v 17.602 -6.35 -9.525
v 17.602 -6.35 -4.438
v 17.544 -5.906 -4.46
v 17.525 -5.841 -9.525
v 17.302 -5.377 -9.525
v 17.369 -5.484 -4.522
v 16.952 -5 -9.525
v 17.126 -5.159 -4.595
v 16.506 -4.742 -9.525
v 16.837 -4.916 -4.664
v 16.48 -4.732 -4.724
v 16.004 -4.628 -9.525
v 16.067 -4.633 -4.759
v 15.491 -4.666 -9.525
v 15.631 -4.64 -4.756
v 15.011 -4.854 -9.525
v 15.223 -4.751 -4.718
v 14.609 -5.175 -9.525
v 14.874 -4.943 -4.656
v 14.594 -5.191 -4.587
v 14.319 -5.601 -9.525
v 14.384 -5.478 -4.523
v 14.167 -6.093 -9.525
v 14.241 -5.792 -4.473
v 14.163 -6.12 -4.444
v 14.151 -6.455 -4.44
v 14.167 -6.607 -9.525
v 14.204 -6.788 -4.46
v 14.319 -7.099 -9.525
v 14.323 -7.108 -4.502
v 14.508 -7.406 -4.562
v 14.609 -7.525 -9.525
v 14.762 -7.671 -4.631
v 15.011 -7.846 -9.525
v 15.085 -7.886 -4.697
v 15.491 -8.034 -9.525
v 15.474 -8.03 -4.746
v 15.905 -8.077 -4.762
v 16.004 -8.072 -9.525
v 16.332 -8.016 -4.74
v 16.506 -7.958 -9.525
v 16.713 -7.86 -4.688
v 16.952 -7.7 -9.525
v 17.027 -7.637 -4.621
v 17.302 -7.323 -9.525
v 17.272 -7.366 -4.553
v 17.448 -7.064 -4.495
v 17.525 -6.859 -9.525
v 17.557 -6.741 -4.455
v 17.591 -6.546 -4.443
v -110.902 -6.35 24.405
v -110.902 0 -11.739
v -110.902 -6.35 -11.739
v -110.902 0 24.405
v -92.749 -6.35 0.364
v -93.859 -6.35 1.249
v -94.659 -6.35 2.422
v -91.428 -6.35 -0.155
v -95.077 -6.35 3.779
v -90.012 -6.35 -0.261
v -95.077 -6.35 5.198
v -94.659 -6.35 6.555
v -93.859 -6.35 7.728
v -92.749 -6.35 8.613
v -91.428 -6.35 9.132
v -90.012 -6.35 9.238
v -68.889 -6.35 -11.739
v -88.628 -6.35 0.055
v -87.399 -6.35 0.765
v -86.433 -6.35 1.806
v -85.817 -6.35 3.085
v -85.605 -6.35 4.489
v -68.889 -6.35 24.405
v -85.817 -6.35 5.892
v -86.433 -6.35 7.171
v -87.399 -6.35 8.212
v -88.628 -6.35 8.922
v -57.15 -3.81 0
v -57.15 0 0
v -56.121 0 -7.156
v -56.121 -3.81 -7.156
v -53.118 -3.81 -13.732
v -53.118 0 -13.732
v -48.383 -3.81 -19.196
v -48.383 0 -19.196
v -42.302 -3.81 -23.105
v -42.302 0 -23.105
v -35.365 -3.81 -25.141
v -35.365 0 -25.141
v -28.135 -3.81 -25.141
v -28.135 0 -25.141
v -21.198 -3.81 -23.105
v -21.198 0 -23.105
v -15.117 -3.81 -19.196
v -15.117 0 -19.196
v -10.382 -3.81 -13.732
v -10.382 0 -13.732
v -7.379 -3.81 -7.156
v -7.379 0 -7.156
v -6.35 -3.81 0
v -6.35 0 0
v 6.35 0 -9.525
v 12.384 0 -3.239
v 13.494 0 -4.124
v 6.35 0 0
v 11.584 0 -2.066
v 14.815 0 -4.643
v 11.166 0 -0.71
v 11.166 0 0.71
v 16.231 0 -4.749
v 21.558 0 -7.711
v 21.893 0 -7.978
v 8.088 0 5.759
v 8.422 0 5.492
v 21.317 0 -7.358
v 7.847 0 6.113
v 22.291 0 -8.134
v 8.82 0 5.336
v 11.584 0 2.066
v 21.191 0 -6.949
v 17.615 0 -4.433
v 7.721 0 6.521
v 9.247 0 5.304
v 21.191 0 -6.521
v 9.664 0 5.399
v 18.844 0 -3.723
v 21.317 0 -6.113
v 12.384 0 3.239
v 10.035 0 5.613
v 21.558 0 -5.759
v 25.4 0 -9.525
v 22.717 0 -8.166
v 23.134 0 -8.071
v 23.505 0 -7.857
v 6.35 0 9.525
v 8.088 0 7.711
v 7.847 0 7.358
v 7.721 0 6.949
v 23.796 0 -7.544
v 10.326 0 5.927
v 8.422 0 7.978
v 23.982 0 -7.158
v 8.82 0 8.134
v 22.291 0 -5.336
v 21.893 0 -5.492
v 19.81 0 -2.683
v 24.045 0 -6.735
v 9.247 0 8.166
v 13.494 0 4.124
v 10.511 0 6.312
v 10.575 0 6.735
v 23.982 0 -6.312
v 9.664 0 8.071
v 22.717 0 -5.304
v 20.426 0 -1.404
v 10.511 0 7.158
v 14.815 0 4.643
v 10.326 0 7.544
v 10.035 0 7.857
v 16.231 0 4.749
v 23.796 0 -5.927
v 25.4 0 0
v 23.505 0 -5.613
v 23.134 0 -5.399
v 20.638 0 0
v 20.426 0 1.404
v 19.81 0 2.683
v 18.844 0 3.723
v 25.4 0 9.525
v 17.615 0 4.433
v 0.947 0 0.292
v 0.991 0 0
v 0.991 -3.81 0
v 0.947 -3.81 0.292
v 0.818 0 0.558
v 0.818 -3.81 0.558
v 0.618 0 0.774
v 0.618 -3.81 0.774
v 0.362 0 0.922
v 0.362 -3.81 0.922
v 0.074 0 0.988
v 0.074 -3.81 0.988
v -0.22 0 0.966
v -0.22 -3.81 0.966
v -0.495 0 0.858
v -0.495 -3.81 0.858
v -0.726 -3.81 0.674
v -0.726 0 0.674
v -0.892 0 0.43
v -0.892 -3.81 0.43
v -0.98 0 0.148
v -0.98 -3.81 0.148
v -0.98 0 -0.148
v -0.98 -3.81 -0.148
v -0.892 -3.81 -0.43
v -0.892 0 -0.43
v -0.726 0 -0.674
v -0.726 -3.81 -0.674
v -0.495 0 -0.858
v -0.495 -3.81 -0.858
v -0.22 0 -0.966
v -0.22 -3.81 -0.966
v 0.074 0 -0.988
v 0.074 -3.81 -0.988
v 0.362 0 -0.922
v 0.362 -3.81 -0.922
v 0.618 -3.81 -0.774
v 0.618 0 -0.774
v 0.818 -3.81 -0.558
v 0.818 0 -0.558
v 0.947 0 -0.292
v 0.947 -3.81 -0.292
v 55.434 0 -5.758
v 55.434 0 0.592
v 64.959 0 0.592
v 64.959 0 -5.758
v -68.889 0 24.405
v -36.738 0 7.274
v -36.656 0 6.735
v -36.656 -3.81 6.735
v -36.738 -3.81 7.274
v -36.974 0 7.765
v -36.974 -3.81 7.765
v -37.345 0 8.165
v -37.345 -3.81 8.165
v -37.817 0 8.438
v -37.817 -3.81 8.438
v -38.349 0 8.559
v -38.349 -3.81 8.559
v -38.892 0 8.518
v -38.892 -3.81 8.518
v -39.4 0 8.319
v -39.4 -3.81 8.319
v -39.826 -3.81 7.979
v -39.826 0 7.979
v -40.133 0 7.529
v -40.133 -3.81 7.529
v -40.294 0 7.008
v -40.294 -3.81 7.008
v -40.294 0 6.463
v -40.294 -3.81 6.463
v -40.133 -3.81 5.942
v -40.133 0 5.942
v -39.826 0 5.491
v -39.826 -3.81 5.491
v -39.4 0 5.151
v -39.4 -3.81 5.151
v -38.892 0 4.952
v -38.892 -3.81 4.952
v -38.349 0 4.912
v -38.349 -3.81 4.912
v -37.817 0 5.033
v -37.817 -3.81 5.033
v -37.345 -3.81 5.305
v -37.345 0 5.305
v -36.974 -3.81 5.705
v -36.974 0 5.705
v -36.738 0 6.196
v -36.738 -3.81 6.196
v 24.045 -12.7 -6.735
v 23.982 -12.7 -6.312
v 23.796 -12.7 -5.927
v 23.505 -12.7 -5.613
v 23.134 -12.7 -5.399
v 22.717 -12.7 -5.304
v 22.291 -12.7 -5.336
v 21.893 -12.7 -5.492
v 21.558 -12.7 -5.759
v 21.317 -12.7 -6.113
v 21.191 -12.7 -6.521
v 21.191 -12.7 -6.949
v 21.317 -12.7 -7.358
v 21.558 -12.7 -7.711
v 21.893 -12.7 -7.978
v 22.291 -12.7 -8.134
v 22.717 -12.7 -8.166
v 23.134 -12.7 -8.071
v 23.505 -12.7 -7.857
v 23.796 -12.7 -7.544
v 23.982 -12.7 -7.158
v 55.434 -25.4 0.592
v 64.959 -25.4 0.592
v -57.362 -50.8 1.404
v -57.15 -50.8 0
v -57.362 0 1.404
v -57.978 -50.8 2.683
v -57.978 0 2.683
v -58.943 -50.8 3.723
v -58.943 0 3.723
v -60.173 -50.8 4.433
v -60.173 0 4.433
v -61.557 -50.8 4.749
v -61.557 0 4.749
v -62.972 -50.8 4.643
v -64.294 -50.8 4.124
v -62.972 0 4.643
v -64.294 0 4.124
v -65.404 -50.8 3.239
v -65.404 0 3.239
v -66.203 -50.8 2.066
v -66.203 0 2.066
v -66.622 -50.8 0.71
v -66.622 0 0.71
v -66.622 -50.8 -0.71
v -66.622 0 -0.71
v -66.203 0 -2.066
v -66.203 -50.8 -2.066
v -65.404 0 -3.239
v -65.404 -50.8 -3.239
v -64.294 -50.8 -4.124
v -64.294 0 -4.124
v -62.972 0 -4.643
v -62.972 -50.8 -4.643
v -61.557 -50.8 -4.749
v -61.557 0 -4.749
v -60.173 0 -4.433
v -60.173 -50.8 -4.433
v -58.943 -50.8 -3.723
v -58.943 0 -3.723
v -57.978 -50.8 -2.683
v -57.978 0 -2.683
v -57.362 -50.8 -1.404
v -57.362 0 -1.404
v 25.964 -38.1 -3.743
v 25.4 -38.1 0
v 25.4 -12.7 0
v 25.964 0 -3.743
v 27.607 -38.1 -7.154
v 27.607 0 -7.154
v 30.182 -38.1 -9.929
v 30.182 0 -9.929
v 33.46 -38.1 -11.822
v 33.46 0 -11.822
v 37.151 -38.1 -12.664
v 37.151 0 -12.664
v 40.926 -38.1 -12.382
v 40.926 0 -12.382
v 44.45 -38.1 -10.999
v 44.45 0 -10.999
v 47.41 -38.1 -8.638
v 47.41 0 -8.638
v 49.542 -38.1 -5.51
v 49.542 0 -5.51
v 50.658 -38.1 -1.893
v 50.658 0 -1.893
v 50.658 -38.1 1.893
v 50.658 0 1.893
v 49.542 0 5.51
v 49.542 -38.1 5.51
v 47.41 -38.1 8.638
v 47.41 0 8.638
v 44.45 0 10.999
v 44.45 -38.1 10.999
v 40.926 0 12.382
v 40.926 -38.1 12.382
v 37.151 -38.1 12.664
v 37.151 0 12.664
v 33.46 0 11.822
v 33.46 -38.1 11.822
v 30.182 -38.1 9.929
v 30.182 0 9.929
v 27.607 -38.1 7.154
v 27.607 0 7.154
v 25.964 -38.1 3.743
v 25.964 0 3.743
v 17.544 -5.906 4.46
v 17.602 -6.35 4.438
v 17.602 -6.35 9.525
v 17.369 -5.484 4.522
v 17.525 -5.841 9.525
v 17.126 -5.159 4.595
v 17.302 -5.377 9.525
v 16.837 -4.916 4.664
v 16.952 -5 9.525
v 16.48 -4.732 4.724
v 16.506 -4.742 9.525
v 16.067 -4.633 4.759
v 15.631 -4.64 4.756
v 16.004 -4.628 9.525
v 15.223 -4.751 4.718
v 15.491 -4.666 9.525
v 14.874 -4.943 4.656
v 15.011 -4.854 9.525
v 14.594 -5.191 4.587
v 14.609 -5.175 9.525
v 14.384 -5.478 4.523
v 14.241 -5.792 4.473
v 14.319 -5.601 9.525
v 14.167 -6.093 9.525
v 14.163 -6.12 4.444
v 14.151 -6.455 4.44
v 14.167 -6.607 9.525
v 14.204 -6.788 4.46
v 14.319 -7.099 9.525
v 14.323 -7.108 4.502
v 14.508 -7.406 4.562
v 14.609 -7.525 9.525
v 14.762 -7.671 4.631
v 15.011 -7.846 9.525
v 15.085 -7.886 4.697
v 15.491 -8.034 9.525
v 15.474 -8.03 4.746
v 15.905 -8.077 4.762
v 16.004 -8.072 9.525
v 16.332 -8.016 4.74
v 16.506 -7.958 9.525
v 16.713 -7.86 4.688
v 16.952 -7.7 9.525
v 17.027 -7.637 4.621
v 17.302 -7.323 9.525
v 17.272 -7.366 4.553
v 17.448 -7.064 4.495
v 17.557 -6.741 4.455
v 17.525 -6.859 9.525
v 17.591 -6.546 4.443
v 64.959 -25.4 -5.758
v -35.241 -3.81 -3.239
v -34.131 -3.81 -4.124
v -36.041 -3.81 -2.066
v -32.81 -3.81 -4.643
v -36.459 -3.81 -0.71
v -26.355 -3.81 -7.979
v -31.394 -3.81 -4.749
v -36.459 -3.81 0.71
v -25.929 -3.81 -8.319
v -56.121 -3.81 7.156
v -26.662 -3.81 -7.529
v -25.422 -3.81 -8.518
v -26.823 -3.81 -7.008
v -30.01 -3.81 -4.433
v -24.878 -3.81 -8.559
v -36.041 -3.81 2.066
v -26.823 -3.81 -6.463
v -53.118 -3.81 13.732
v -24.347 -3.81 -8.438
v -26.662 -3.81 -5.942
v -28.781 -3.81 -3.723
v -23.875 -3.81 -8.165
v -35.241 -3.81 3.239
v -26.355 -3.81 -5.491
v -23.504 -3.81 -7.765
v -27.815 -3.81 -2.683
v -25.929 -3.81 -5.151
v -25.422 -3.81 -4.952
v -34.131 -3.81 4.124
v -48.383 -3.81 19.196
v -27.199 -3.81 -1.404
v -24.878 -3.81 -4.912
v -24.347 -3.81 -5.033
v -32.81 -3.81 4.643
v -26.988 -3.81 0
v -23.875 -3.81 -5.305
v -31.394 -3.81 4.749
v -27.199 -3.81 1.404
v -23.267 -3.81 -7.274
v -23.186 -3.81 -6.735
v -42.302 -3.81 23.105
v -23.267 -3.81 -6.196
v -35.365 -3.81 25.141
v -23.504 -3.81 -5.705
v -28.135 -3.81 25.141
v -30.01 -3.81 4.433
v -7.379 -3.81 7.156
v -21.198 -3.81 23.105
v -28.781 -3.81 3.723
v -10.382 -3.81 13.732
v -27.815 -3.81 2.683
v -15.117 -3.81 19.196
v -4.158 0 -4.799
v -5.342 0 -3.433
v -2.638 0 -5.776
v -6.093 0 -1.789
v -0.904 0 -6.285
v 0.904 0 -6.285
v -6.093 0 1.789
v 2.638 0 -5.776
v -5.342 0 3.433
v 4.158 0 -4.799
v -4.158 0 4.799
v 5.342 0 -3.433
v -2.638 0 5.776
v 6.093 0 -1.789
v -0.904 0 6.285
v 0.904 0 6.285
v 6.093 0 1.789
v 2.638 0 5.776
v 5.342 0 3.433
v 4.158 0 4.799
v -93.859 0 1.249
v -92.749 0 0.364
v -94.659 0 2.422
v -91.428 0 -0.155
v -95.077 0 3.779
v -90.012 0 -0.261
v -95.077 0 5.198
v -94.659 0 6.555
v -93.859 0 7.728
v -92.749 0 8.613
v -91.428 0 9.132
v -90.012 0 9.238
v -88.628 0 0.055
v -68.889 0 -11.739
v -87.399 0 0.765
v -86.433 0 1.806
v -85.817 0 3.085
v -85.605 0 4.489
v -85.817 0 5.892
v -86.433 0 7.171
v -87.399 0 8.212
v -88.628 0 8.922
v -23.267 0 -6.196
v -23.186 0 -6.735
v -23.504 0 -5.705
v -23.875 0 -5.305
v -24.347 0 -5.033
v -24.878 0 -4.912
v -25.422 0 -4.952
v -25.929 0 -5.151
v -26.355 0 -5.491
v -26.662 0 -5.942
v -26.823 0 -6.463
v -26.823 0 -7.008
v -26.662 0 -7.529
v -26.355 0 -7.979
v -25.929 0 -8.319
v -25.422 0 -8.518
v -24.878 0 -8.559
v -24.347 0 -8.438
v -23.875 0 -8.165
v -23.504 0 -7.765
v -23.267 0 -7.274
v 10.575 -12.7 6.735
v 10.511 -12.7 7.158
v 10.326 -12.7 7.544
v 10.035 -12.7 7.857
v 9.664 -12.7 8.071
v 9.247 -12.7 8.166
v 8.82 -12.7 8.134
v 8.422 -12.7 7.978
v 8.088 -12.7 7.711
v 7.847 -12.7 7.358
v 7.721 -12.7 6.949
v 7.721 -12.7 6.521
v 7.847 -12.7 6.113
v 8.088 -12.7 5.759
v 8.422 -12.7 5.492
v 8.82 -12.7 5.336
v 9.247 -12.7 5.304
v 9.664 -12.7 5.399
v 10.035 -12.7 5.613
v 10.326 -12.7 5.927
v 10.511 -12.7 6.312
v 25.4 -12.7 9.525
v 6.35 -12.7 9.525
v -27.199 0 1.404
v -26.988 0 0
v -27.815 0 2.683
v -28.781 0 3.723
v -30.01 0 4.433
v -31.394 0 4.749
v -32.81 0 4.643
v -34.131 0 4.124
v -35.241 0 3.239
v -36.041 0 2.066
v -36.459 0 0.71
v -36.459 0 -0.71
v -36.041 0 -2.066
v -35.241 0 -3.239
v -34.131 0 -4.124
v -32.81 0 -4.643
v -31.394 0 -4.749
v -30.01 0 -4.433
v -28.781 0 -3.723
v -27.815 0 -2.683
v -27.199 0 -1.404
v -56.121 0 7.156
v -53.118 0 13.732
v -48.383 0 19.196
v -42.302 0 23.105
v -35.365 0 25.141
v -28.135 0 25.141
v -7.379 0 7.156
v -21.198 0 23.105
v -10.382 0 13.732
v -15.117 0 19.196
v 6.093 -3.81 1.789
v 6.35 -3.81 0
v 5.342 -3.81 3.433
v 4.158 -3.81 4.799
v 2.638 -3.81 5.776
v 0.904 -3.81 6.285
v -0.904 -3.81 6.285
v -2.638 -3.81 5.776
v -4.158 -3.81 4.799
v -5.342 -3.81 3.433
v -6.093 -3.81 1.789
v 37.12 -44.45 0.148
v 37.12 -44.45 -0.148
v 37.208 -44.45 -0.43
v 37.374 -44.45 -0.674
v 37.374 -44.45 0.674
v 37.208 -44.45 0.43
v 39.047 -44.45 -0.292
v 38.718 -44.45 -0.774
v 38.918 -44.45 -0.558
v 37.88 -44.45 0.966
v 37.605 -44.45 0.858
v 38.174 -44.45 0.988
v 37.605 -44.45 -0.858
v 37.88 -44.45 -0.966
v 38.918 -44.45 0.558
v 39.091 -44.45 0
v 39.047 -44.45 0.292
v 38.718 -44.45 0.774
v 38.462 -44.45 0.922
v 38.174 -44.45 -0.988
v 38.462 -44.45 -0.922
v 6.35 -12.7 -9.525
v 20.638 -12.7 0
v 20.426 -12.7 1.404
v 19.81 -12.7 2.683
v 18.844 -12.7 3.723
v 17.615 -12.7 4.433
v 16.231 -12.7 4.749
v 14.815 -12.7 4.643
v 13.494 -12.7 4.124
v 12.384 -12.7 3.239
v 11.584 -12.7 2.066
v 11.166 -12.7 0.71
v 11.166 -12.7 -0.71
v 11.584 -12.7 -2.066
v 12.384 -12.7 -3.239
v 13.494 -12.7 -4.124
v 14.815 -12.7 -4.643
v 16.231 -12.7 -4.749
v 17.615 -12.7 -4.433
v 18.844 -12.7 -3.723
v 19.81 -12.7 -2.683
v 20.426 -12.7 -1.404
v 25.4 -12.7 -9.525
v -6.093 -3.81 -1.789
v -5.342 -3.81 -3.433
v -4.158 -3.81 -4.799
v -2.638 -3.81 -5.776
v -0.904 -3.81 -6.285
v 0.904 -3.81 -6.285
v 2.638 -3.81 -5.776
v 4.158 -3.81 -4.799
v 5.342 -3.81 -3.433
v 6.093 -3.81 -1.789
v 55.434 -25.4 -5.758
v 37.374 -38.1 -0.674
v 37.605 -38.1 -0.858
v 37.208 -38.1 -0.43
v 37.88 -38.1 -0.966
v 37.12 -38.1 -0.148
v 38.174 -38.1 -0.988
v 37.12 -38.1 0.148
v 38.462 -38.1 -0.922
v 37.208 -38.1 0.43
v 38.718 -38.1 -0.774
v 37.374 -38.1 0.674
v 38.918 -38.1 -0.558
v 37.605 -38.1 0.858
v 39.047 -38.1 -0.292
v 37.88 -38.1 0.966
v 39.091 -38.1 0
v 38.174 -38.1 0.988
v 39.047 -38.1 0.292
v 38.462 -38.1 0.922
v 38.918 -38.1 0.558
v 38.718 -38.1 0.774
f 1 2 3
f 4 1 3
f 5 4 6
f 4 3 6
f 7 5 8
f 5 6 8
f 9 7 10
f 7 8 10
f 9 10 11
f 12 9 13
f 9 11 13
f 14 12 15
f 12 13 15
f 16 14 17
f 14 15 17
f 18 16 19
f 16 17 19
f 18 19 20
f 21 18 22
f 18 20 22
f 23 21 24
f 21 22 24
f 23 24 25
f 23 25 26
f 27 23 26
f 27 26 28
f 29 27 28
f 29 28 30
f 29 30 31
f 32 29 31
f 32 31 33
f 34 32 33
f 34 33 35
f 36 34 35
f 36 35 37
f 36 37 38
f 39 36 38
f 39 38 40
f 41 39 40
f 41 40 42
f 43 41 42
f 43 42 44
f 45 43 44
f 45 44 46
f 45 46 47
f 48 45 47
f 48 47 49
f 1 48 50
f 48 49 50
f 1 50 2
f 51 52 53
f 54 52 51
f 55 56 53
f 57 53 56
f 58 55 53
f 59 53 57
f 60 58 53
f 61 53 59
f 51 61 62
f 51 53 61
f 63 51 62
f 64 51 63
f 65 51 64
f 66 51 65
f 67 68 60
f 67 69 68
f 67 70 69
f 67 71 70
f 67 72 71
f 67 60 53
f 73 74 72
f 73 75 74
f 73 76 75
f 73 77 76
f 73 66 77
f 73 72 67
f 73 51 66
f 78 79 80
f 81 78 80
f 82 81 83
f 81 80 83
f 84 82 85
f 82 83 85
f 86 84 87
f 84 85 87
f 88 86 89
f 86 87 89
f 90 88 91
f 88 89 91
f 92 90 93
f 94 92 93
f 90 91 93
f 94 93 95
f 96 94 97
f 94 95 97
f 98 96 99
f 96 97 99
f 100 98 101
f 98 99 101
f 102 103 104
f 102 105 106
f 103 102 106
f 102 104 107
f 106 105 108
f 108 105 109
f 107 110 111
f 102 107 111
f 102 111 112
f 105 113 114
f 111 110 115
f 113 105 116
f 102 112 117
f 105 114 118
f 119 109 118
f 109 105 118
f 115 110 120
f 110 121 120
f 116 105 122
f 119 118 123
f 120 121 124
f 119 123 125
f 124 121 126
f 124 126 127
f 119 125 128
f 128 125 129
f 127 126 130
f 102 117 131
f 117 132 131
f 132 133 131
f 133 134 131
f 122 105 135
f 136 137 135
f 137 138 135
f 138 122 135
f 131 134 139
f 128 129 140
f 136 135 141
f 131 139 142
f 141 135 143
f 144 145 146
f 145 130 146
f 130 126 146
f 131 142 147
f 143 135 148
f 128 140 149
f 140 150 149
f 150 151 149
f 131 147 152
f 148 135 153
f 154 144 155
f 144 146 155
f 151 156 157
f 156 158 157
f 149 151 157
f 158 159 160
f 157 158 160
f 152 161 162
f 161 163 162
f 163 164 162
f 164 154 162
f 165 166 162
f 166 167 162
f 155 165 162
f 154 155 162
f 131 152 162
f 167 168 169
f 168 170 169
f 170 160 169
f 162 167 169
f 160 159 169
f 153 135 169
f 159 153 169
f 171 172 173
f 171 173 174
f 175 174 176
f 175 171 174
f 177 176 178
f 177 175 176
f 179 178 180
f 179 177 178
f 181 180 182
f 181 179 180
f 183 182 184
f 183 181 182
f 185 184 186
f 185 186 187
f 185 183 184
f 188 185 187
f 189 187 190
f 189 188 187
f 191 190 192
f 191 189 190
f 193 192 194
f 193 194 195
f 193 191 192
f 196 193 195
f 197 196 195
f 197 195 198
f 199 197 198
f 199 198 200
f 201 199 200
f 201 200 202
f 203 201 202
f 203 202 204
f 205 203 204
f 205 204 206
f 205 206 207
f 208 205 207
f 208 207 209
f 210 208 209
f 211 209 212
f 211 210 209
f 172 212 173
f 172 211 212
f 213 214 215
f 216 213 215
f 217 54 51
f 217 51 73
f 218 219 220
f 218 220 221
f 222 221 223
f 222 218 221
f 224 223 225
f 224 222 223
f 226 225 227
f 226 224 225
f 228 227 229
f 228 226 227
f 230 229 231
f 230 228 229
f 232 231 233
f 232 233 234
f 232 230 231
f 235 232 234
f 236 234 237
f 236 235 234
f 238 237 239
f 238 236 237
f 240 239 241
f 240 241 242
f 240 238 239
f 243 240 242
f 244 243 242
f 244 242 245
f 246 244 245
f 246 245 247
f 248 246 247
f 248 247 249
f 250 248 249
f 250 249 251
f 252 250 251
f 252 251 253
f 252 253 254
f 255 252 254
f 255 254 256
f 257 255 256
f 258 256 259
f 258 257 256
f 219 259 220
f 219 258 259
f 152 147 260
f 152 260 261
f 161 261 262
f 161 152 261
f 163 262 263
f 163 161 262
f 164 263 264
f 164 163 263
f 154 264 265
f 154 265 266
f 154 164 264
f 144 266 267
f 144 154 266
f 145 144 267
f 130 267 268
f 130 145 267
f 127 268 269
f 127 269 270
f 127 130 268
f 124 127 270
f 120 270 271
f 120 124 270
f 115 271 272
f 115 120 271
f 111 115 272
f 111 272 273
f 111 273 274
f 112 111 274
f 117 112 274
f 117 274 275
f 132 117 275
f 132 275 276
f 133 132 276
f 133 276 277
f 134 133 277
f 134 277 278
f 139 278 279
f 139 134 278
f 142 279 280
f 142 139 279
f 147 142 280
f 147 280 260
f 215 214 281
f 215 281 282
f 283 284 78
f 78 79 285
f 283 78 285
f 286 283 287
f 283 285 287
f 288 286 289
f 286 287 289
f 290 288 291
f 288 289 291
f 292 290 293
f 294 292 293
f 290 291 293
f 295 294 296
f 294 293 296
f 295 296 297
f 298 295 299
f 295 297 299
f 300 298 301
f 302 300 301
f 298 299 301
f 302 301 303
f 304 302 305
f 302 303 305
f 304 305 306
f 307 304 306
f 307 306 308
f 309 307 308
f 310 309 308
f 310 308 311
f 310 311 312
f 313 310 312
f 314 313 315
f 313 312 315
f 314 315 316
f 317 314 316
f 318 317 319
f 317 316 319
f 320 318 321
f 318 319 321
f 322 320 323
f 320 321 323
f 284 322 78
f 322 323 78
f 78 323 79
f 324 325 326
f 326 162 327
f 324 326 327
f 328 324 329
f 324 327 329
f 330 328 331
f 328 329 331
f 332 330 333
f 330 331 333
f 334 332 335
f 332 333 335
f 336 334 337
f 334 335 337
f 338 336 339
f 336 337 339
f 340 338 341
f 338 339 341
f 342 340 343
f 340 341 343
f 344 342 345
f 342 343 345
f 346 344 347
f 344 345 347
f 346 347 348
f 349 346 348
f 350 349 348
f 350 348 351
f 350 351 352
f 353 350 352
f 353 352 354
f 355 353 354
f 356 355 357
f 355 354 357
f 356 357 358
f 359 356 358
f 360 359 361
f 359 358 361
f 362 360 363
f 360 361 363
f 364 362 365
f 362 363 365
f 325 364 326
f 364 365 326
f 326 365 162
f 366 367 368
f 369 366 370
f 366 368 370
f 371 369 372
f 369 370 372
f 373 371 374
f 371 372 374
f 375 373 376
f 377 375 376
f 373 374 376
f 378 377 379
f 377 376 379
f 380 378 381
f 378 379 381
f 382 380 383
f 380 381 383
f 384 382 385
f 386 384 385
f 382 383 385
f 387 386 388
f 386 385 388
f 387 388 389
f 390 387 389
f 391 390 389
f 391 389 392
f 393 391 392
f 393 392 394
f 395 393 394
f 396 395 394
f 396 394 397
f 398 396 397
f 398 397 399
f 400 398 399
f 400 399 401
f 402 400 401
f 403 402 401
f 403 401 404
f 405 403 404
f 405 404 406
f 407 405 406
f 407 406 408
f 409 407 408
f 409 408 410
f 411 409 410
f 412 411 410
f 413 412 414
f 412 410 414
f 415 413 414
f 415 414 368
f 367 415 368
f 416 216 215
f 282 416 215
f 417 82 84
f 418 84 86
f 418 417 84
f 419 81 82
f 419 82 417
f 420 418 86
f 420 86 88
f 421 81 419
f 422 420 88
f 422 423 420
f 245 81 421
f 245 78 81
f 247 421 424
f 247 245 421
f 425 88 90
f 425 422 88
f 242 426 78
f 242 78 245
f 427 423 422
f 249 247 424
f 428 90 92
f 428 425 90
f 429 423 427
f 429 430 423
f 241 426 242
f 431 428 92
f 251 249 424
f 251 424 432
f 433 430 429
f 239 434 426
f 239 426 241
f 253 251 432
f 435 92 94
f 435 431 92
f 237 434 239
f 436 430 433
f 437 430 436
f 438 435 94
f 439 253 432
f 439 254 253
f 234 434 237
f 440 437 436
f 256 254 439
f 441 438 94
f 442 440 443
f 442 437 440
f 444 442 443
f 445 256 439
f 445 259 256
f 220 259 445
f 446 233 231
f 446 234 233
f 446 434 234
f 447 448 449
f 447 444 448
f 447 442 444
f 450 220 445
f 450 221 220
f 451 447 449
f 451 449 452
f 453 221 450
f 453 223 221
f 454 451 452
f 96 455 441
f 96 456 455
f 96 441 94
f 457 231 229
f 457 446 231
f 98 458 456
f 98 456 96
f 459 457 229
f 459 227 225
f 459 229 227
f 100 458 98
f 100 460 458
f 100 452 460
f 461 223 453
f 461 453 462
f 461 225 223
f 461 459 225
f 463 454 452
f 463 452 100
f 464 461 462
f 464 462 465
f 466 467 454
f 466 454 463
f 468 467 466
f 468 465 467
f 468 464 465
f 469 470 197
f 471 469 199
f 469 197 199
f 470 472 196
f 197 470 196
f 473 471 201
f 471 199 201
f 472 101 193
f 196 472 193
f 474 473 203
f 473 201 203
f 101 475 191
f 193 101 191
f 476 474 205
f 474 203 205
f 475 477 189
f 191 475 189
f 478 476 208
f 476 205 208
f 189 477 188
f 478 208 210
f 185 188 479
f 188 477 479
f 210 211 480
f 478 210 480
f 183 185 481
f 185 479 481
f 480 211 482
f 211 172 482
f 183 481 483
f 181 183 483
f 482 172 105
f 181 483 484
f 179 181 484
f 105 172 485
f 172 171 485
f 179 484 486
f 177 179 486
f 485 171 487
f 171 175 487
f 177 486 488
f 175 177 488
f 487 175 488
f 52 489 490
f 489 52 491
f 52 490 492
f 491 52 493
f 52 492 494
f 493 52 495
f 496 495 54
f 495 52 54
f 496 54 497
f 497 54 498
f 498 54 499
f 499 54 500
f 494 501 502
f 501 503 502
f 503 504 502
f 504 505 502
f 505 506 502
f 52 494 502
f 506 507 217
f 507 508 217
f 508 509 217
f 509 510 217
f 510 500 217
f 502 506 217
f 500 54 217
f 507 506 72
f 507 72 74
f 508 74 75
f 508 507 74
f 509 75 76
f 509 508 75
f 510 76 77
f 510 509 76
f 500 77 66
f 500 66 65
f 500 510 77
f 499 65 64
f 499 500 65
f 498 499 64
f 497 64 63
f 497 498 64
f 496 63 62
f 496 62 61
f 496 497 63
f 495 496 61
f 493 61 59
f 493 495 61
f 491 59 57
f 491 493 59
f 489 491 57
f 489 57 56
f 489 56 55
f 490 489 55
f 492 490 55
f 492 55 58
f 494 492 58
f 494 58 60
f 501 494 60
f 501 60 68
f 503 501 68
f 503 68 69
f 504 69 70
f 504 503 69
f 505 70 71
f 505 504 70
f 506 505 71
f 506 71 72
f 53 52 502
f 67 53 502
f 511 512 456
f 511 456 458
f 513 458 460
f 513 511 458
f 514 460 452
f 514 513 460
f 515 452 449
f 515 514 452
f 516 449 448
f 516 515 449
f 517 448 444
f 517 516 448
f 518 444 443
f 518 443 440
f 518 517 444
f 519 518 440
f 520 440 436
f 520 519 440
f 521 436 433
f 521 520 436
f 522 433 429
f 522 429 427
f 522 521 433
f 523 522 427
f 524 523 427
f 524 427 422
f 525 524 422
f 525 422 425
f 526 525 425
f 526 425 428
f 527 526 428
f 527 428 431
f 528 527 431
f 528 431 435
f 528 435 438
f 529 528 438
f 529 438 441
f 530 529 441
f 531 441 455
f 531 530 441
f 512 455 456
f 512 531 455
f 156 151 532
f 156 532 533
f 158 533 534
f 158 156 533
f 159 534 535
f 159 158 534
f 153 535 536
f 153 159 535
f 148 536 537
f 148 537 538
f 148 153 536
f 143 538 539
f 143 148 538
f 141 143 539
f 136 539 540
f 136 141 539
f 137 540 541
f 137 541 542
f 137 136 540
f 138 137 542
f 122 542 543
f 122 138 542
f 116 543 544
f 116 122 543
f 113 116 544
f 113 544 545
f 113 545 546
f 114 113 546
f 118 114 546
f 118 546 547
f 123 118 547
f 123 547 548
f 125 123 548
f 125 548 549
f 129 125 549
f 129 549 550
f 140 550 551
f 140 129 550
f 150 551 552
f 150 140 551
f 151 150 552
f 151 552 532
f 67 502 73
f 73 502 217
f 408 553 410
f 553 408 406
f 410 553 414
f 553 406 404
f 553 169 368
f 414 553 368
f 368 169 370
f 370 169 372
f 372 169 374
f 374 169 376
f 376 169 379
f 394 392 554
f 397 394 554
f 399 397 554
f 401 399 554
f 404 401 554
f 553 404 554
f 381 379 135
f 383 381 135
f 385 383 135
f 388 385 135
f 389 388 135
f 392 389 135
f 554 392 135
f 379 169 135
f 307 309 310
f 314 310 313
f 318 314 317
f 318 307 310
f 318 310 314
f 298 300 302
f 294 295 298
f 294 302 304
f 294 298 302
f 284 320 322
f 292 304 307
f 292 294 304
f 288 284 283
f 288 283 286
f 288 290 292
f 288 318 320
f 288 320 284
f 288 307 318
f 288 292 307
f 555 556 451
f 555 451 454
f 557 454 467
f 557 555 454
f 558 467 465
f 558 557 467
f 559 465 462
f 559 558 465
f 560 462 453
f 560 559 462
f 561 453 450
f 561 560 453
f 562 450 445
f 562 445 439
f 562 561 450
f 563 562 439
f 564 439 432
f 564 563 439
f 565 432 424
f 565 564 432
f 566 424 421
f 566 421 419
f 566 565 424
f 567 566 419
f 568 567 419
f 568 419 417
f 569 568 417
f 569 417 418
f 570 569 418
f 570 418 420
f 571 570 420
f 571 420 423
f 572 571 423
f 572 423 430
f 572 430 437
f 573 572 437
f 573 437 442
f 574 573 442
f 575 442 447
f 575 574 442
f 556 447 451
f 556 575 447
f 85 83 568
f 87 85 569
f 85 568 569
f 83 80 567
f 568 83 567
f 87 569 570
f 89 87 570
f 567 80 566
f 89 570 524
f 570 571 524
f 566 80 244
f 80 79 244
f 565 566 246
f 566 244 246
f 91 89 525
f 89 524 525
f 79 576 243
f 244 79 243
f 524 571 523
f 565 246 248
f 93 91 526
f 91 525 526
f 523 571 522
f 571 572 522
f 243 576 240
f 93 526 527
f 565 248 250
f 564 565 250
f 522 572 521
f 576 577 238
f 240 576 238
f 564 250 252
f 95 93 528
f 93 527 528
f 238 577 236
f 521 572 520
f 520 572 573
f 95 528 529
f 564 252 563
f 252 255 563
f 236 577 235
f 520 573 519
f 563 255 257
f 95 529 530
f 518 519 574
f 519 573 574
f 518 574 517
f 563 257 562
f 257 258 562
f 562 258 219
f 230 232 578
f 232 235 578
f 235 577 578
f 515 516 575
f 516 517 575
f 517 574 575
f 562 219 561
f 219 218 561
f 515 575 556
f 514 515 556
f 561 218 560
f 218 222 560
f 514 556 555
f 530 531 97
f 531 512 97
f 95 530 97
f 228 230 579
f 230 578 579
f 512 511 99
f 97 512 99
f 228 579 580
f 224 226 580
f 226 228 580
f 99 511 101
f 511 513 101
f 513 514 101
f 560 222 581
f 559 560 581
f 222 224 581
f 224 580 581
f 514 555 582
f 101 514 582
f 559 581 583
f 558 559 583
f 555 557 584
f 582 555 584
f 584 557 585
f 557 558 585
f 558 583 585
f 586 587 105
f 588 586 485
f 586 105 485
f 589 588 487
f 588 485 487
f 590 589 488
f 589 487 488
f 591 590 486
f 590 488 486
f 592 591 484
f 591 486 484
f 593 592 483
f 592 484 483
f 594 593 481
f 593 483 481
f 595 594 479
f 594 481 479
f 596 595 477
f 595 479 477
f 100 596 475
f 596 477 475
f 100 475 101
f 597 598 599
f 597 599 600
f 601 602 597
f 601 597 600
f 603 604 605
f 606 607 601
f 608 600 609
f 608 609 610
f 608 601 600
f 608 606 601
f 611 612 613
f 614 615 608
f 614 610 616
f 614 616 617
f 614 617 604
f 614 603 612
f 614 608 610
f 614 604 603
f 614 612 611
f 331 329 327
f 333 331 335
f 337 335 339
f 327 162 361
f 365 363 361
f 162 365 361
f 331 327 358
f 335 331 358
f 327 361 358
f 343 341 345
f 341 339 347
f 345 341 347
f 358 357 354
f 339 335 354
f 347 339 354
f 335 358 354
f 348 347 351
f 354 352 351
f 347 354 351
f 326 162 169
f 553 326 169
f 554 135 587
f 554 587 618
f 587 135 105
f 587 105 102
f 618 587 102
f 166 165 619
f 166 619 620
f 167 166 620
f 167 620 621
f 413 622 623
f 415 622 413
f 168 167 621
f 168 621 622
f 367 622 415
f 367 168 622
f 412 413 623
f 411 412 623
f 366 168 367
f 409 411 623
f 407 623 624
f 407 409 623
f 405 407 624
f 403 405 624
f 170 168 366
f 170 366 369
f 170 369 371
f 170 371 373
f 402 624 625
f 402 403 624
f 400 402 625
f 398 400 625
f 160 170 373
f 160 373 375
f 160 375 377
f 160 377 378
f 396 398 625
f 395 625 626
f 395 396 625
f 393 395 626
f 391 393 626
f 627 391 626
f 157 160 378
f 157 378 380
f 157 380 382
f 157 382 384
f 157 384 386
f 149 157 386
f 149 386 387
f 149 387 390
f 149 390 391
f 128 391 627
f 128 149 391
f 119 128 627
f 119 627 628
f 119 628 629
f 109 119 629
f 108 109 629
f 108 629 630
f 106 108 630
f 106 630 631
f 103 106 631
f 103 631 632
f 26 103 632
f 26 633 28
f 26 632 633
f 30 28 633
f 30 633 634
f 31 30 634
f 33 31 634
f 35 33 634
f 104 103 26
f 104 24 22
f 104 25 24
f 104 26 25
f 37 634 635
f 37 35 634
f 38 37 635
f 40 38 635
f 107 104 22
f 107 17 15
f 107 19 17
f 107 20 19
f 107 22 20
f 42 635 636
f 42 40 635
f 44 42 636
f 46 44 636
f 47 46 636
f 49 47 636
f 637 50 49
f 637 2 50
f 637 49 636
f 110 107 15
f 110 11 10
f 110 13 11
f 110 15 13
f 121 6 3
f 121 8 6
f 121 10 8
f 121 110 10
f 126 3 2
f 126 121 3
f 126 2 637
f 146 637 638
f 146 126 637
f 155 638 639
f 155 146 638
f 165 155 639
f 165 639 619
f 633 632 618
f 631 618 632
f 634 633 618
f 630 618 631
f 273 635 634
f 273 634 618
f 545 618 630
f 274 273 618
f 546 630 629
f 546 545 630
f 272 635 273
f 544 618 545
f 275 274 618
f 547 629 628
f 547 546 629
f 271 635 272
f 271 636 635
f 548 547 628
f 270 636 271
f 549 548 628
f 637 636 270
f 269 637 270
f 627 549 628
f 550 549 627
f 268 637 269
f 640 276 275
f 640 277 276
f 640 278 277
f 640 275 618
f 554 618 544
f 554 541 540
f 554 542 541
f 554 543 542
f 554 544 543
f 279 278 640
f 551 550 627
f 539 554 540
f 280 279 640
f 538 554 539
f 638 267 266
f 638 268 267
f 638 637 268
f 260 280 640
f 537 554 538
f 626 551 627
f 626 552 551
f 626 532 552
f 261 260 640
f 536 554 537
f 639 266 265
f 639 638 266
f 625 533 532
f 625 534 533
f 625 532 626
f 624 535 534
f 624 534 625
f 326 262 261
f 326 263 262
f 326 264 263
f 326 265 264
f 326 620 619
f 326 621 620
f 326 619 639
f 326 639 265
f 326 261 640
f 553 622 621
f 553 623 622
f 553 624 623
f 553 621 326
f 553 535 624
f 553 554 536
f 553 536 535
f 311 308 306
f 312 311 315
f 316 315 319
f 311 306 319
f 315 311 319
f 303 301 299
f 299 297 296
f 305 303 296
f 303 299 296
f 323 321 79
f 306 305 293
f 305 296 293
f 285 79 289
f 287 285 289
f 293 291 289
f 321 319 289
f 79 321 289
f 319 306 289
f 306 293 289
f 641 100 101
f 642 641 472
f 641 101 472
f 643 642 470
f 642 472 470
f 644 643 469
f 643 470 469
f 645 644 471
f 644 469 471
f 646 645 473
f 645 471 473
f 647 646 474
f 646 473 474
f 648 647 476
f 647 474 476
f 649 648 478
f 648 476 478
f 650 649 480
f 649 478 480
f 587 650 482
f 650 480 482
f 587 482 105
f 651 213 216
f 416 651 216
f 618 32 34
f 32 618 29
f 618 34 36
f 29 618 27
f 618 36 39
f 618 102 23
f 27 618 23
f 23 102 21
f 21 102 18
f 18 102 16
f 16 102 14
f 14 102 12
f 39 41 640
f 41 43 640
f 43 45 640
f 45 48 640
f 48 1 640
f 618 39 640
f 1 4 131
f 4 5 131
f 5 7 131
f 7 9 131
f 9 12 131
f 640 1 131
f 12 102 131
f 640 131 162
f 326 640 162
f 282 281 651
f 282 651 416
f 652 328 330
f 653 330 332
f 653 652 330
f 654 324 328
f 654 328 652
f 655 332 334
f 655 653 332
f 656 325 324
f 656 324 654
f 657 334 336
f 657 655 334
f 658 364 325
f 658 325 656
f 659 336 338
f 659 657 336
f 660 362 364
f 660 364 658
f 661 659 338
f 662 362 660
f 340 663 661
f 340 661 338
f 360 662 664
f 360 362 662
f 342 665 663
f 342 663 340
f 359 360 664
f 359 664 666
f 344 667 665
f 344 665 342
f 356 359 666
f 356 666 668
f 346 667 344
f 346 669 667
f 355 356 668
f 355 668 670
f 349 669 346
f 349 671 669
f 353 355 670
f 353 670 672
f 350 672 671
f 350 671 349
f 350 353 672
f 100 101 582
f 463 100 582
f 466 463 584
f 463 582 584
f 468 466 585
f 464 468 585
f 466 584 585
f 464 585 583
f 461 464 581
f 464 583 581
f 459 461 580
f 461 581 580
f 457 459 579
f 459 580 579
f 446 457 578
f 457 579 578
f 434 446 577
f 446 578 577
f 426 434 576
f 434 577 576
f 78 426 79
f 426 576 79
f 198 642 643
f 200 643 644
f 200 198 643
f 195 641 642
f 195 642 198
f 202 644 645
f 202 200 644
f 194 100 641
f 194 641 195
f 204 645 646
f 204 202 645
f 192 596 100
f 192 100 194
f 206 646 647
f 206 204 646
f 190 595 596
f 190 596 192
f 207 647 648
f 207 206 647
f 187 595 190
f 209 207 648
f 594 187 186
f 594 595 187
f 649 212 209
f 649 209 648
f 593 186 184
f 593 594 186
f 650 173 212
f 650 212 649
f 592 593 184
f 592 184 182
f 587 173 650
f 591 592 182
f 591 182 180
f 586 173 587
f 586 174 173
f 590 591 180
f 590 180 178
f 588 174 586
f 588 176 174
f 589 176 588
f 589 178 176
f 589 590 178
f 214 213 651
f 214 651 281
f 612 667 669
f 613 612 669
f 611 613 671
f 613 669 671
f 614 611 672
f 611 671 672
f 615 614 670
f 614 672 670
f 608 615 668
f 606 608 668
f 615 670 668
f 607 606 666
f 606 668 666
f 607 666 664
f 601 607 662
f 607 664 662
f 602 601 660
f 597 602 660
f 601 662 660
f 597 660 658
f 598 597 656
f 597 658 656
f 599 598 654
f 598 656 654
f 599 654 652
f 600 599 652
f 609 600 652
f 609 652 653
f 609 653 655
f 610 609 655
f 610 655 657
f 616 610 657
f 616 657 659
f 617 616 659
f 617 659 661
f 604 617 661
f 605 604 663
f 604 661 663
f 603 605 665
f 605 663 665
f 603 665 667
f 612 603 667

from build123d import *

# Parameters (mm, degrees)
F0_R      = 1.8288
F0_R_2    = 4.7625
F0_R_3    = 0.9906
F1_DEPTH  = 3.81
F0_R_4    = 1.4351
F2_DEPTH  = 12.7
F3_DEPTH  = 38.1
F4_R      = 0.9906
F5_DEPTH  = 6.35
F0_W      = 9.525
F0_H      = 6.35
F6_DEPTH  = 25.4
F7_R      = 1.7272
F8_DEPTH  = 34.926
F9_DEPTH  = 50.8
F0_W_2    = 42.012974
F0_H_2    = 36.143516
F10_DEPTH = 6.35


with BuildPart() as f1:
    # F0 (on Front) → F1 (new body)
    with BuildSketch(Plane.XZ):
        with BuildLine():
            ThreePointArc((-57.15, 0), (-31.75, -25.4), (-6.35, 0))
            ThreePointArc((-6.35, 0), (-31.75, 25.4), (-57.15, 0))
        make_face()
        with Locations((-25.014808, -6.735192)):
            Circle(F0_R, mode=Mode.SUBTRACT)
        with Locations((-31.75, 0)):
            Circle(F0_R_2, mode=Mode.SUBTRACT)
        with Locations((-38.485192, 6.735192)):
            Circle(F0_R, mode=Mode.SUBTRACT)
        with BuildLine():
            ThreePointArc((-6.35, 0), (0, -6.35), (6.35, 0))
            ThreePointArc((6.35, 0), (0, 6.35), (-6.35, 0))
        make_face()
        Circle(F0_R_3, mode=Mode.SUBTRACT)
    extrude(amount=F1_DEPTH)

    # F0 (on Front) → F2 (join)
    with BuildSketch(Plane.XZ):
        Polygon((6.35, 9.525), (6.35, 0), (6.35, -9.525), (25.4, -9.525), (25.4, 0), (25.4, 9.525), align=None)
        with Locations((15.875, 0)):
            Circle(F0_R_2, mode=Mode.SUBTRACT)
        with Locations((22.610192, -6.735192)):
            Circle(F0_R_4, mode=Mode.SUBTRACT)
        with Locations((9.139808, 6.735192)):
            Circle(F0_R_4, mode=Mode.SUBTRACT)
    extrude(amount=F2_DEPTH)

    # F0 (on Front) → F3 (join)
    with BuildSketch(Plane.XZ):
        with BuildLine():
            ThreePointArc((50.8, 0), (38.1, 12.7), (25.4, 0))
            ThreePointArc((25.4, 0), (38.1, -12.7), (50.8, 0))
        make_face()
    extrude(amount=F3_DEPTH)

    # F4 (on face) → F5 (join)
    with BuildSketch(Plane.XZ.offset(38.1)):
        with Locations((38.1, 0)):
            Circle(F4_R)
    extrude(amount=F5_DEPTH)

    # F7 (on face) → F8 (cut, through all)
    with BuildSketch(Plane.XY.offset(9.525)):
        with Locations((15.875, -6.35)):
            Circle(F7_R)
    extrude(amount=-F8_DEPTH, mode=Mode.SUBTRACT)

    # F0 (on Front) → F9 (join)
    with BuildSketch(Plane.XZ):
        with Locations((-61.9125, 0)):
            Circle(F0_R_2)
    extrude(amount=F9_DEPTH)


with BuildPart() as f6:
    # F0 (on Front) → F6 (new body)
    with BuildSketch(Plane.XZ):
        with Locations((60.196544, -2.582707)):
            Rectangle(F0_W, F0_H)
    extrude(amount=F6_DEPTH)


with BuildPart() as f10:
    # F0 (on Front) → F10 (new body)
    with BuildSketch(Plane.XZ):
        with Locations((-89.895405, 6.332839)):
            Rectangle(F0_W_2, F0_H_2)
        with Locations((-90.367973, 4.488509)):
            Circle(F0_R_2, mode=Mode.SUBTRACT)
    extrude(amount=F10_DEPTH)


solid = Compound([f1.part, f6.part, f10.part])
